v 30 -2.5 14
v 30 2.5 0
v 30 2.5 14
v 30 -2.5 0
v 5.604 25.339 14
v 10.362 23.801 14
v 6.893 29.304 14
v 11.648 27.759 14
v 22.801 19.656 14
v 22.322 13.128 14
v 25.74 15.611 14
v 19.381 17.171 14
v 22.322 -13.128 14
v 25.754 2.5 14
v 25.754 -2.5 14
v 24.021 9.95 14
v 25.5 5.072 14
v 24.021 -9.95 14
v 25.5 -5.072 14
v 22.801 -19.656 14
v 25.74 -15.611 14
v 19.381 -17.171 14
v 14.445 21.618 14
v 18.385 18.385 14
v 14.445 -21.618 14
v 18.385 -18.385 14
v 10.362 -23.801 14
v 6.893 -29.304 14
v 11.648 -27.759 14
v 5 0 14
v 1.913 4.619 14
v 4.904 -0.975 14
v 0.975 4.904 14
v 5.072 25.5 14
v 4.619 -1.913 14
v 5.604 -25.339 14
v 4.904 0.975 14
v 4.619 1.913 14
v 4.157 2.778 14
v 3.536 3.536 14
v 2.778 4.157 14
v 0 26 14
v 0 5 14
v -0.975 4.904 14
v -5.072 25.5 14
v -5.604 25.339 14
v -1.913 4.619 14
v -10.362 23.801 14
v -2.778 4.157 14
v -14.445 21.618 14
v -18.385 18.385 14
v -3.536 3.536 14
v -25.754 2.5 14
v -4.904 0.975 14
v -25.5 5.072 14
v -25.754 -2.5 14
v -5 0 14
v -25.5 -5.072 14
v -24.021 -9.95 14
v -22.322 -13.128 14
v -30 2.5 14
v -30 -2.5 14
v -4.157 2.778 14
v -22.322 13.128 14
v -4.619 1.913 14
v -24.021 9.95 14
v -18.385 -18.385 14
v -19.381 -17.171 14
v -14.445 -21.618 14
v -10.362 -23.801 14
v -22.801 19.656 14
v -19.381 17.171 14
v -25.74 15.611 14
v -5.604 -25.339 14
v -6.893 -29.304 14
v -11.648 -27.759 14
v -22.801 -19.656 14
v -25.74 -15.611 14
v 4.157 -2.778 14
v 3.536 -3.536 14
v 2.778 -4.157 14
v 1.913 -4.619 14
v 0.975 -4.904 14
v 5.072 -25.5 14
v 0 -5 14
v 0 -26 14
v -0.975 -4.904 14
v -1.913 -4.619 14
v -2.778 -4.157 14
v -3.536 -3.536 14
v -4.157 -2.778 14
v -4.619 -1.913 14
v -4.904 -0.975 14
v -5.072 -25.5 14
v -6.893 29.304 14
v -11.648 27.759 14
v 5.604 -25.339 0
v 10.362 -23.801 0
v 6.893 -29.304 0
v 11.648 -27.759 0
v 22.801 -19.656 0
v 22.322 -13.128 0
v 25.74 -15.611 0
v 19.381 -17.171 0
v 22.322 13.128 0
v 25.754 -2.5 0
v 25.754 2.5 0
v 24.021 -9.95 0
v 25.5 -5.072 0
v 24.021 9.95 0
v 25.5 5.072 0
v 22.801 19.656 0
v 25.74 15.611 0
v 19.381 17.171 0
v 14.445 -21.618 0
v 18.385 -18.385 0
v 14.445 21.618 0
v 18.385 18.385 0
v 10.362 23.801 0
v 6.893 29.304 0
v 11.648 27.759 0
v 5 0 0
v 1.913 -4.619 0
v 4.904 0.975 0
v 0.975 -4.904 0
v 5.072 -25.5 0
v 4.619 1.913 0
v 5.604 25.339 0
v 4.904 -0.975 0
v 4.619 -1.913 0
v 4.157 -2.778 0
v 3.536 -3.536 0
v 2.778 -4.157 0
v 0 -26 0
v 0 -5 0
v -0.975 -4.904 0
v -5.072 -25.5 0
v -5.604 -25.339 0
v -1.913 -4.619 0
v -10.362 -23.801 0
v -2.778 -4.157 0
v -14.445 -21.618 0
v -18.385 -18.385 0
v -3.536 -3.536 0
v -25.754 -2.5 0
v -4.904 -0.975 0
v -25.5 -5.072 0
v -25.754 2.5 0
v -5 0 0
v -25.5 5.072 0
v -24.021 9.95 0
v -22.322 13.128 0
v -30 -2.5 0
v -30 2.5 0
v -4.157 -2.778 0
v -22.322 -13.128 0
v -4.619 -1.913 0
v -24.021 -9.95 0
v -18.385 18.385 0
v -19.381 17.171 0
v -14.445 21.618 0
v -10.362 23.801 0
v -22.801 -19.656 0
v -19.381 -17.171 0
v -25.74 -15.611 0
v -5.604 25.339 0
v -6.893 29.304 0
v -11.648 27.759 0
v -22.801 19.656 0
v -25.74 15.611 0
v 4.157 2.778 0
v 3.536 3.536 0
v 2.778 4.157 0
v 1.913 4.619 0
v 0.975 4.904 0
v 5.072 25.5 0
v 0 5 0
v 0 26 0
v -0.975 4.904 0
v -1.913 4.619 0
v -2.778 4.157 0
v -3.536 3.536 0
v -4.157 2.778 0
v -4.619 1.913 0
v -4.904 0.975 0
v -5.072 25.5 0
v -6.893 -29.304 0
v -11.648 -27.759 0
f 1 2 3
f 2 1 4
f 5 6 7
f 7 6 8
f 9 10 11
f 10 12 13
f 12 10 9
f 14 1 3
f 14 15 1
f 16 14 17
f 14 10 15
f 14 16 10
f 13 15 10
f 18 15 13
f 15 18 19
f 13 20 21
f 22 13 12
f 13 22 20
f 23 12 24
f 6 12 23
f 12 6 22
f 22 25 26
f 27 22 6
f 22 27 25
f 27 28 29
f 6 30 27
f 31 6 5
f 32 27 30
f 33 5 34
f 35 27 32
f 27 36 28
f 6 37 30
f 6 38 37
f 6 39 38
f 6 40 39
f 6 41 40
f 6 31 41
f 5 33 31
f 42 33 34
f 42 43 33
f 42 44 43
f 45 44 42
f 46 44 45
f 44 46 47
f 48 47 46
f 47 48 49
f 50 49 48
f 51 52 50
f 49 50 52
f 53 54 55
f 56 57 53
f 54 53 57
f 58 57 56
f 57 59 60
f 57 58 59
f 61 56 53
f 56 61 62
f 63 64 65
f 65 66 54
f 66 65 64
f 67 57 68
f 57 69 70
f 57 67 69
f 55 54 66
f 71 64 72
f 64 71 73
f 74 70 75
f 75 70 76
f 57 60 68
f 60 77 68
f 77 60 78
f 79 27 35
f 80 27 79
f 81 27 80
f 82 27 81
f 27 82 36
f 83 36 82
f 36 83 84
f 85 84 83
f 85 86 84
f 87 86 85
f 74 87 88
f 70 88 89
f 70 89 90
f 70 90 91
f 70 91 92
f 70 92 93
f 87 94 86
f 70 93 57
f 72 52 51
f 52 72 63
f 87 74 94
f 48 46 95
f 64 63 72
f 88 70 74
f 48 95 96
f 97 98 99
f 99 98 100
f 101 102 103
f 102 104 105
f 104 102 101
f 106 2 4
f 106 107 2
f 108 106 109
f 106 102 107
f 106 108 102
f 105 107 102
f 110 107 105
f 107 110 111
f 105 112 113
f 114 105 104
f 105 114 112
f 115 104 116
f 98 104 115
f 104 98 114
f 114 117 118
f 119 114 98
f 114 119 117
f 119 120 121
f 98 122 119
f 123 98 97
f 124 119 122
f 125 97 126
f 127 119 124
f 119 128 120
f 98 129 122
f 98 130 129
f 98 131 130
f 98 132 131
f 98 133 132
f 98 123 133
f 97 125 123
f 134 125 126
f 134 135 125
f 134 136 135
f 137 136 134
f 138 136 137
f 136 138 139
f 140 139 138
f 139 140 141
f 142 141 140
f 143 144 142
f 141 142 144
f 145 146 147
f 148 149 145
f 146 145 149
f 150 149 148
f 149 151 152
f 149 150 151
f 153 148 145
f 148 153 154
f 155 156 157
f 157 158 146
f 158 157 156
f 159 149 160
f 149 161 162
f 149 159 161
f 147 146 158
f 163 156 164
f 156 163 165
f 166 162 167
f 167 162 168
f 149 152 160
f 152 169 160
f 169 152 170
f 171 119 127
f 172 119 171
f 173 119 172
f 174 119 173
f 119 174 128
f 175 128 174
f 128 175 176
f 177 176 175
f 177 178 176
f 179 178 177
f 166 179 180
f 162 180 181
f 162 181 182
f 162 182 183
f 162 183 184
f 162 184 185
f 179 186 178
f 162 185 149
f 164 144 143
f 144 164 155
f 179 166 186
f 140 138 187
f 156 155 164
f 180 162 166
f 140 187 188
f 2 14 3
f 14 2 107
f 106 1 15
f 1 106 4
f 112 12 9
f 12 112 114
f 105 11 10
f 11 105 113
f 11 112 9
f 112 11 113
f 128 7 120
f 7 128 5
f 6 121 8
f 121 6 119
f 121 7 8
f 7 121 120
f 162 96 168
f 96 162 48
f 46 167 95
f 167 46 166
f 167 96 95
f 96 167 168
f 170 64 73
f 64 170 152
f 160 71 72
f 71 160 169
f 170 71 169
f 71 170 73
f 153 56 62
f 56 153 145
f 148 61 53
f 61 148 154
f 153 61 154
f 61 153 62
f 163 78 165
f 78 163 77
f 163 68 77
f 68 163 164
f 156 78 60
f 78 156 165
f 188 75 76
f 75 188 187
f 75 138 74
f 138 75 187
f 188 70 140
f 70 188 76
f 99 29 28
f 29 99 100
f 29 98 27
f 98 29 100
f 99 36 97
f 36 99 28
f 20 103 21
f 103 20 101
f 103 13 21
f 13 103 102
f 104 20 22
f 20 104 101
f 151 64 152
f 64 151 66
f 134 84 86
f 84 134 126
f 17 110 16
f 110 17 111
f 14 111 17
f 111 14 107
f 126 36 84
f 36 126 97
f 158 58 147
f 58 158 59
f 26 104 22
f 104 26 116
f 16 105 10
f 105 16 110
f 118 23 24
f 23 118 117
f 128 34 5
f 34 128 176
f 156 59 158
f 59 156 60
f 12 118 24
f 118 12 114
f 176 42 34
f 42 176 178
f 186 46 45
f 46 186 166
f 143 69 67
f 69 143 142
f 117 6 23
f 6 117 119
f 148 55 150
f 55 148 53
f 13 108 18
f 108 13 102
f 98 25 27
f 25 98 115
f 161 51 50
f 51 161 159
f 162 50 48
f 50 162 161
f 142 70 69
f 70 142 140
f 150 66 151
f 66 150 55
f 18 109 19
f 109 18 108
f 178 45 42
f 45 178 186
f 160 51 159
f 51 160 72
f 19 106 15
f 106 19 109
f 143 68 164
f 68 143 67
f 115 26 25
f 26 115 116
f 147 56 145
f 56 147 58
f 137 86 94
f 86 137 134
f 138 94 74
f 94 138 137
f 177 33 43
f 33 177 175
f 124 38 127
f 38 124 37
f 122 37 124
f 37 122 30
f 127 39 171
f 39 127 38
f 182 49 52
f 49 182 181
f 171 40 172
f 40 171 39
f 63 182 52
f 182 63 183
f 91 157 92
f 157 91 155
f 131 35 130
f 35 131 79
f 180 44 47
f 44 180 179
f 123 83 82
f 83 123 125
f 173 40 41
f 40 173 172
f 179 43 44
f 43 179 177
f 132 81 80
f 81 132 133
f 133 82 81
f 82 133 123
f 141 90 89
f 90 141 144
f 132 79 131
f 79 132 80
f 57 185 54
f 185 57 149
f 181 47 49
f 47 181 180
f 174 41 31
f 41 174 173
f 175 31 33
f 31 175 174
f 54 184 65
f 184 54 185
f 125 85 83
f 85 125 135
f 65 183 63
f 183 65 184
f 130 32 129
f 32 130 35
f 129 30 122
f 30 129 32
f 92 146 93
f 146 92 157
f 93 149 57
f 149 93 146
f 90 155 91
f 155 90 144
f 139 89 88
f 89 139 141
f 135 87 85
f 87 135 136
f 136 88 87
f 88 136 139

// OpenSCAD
$fn = 32;

// ----------------------------------------------------------------------
// Spur blank: bored gear blank
// ----------------------------------------------------------------------

// --- parameters (mm) ---
disc_r = 26;              // blank root radius
disc_t = 14;              // blank thickness
n_teeth = 10;             // stub tooth count
tooth_w = 5;              // tooth width at the root
tooth_h = 4;              // tooth height above the root
bore_r = 5;               // central bore radius

out_r = disc_r + tooth_h;  // tip radius
bbox_x = 60.0;  // measured width over the teeth
bbox_y = 58.61;  // measured depth over the teeth

difference() {
union() {
  cylinder(r = disc_r, h = disc_t);
  for (i = [0 : n_teeth - 1])
    rotate([0, 0, i * 360 / n_teeth])
      translate([disc_r - 1, -tooth_w / 2, 0])
        cube([tooth_h + 1, tooth_w, disc_t]);
}
  translate([0, 0, -1]) cylinder(r = bore_r, h = disc_t + 2);
}
